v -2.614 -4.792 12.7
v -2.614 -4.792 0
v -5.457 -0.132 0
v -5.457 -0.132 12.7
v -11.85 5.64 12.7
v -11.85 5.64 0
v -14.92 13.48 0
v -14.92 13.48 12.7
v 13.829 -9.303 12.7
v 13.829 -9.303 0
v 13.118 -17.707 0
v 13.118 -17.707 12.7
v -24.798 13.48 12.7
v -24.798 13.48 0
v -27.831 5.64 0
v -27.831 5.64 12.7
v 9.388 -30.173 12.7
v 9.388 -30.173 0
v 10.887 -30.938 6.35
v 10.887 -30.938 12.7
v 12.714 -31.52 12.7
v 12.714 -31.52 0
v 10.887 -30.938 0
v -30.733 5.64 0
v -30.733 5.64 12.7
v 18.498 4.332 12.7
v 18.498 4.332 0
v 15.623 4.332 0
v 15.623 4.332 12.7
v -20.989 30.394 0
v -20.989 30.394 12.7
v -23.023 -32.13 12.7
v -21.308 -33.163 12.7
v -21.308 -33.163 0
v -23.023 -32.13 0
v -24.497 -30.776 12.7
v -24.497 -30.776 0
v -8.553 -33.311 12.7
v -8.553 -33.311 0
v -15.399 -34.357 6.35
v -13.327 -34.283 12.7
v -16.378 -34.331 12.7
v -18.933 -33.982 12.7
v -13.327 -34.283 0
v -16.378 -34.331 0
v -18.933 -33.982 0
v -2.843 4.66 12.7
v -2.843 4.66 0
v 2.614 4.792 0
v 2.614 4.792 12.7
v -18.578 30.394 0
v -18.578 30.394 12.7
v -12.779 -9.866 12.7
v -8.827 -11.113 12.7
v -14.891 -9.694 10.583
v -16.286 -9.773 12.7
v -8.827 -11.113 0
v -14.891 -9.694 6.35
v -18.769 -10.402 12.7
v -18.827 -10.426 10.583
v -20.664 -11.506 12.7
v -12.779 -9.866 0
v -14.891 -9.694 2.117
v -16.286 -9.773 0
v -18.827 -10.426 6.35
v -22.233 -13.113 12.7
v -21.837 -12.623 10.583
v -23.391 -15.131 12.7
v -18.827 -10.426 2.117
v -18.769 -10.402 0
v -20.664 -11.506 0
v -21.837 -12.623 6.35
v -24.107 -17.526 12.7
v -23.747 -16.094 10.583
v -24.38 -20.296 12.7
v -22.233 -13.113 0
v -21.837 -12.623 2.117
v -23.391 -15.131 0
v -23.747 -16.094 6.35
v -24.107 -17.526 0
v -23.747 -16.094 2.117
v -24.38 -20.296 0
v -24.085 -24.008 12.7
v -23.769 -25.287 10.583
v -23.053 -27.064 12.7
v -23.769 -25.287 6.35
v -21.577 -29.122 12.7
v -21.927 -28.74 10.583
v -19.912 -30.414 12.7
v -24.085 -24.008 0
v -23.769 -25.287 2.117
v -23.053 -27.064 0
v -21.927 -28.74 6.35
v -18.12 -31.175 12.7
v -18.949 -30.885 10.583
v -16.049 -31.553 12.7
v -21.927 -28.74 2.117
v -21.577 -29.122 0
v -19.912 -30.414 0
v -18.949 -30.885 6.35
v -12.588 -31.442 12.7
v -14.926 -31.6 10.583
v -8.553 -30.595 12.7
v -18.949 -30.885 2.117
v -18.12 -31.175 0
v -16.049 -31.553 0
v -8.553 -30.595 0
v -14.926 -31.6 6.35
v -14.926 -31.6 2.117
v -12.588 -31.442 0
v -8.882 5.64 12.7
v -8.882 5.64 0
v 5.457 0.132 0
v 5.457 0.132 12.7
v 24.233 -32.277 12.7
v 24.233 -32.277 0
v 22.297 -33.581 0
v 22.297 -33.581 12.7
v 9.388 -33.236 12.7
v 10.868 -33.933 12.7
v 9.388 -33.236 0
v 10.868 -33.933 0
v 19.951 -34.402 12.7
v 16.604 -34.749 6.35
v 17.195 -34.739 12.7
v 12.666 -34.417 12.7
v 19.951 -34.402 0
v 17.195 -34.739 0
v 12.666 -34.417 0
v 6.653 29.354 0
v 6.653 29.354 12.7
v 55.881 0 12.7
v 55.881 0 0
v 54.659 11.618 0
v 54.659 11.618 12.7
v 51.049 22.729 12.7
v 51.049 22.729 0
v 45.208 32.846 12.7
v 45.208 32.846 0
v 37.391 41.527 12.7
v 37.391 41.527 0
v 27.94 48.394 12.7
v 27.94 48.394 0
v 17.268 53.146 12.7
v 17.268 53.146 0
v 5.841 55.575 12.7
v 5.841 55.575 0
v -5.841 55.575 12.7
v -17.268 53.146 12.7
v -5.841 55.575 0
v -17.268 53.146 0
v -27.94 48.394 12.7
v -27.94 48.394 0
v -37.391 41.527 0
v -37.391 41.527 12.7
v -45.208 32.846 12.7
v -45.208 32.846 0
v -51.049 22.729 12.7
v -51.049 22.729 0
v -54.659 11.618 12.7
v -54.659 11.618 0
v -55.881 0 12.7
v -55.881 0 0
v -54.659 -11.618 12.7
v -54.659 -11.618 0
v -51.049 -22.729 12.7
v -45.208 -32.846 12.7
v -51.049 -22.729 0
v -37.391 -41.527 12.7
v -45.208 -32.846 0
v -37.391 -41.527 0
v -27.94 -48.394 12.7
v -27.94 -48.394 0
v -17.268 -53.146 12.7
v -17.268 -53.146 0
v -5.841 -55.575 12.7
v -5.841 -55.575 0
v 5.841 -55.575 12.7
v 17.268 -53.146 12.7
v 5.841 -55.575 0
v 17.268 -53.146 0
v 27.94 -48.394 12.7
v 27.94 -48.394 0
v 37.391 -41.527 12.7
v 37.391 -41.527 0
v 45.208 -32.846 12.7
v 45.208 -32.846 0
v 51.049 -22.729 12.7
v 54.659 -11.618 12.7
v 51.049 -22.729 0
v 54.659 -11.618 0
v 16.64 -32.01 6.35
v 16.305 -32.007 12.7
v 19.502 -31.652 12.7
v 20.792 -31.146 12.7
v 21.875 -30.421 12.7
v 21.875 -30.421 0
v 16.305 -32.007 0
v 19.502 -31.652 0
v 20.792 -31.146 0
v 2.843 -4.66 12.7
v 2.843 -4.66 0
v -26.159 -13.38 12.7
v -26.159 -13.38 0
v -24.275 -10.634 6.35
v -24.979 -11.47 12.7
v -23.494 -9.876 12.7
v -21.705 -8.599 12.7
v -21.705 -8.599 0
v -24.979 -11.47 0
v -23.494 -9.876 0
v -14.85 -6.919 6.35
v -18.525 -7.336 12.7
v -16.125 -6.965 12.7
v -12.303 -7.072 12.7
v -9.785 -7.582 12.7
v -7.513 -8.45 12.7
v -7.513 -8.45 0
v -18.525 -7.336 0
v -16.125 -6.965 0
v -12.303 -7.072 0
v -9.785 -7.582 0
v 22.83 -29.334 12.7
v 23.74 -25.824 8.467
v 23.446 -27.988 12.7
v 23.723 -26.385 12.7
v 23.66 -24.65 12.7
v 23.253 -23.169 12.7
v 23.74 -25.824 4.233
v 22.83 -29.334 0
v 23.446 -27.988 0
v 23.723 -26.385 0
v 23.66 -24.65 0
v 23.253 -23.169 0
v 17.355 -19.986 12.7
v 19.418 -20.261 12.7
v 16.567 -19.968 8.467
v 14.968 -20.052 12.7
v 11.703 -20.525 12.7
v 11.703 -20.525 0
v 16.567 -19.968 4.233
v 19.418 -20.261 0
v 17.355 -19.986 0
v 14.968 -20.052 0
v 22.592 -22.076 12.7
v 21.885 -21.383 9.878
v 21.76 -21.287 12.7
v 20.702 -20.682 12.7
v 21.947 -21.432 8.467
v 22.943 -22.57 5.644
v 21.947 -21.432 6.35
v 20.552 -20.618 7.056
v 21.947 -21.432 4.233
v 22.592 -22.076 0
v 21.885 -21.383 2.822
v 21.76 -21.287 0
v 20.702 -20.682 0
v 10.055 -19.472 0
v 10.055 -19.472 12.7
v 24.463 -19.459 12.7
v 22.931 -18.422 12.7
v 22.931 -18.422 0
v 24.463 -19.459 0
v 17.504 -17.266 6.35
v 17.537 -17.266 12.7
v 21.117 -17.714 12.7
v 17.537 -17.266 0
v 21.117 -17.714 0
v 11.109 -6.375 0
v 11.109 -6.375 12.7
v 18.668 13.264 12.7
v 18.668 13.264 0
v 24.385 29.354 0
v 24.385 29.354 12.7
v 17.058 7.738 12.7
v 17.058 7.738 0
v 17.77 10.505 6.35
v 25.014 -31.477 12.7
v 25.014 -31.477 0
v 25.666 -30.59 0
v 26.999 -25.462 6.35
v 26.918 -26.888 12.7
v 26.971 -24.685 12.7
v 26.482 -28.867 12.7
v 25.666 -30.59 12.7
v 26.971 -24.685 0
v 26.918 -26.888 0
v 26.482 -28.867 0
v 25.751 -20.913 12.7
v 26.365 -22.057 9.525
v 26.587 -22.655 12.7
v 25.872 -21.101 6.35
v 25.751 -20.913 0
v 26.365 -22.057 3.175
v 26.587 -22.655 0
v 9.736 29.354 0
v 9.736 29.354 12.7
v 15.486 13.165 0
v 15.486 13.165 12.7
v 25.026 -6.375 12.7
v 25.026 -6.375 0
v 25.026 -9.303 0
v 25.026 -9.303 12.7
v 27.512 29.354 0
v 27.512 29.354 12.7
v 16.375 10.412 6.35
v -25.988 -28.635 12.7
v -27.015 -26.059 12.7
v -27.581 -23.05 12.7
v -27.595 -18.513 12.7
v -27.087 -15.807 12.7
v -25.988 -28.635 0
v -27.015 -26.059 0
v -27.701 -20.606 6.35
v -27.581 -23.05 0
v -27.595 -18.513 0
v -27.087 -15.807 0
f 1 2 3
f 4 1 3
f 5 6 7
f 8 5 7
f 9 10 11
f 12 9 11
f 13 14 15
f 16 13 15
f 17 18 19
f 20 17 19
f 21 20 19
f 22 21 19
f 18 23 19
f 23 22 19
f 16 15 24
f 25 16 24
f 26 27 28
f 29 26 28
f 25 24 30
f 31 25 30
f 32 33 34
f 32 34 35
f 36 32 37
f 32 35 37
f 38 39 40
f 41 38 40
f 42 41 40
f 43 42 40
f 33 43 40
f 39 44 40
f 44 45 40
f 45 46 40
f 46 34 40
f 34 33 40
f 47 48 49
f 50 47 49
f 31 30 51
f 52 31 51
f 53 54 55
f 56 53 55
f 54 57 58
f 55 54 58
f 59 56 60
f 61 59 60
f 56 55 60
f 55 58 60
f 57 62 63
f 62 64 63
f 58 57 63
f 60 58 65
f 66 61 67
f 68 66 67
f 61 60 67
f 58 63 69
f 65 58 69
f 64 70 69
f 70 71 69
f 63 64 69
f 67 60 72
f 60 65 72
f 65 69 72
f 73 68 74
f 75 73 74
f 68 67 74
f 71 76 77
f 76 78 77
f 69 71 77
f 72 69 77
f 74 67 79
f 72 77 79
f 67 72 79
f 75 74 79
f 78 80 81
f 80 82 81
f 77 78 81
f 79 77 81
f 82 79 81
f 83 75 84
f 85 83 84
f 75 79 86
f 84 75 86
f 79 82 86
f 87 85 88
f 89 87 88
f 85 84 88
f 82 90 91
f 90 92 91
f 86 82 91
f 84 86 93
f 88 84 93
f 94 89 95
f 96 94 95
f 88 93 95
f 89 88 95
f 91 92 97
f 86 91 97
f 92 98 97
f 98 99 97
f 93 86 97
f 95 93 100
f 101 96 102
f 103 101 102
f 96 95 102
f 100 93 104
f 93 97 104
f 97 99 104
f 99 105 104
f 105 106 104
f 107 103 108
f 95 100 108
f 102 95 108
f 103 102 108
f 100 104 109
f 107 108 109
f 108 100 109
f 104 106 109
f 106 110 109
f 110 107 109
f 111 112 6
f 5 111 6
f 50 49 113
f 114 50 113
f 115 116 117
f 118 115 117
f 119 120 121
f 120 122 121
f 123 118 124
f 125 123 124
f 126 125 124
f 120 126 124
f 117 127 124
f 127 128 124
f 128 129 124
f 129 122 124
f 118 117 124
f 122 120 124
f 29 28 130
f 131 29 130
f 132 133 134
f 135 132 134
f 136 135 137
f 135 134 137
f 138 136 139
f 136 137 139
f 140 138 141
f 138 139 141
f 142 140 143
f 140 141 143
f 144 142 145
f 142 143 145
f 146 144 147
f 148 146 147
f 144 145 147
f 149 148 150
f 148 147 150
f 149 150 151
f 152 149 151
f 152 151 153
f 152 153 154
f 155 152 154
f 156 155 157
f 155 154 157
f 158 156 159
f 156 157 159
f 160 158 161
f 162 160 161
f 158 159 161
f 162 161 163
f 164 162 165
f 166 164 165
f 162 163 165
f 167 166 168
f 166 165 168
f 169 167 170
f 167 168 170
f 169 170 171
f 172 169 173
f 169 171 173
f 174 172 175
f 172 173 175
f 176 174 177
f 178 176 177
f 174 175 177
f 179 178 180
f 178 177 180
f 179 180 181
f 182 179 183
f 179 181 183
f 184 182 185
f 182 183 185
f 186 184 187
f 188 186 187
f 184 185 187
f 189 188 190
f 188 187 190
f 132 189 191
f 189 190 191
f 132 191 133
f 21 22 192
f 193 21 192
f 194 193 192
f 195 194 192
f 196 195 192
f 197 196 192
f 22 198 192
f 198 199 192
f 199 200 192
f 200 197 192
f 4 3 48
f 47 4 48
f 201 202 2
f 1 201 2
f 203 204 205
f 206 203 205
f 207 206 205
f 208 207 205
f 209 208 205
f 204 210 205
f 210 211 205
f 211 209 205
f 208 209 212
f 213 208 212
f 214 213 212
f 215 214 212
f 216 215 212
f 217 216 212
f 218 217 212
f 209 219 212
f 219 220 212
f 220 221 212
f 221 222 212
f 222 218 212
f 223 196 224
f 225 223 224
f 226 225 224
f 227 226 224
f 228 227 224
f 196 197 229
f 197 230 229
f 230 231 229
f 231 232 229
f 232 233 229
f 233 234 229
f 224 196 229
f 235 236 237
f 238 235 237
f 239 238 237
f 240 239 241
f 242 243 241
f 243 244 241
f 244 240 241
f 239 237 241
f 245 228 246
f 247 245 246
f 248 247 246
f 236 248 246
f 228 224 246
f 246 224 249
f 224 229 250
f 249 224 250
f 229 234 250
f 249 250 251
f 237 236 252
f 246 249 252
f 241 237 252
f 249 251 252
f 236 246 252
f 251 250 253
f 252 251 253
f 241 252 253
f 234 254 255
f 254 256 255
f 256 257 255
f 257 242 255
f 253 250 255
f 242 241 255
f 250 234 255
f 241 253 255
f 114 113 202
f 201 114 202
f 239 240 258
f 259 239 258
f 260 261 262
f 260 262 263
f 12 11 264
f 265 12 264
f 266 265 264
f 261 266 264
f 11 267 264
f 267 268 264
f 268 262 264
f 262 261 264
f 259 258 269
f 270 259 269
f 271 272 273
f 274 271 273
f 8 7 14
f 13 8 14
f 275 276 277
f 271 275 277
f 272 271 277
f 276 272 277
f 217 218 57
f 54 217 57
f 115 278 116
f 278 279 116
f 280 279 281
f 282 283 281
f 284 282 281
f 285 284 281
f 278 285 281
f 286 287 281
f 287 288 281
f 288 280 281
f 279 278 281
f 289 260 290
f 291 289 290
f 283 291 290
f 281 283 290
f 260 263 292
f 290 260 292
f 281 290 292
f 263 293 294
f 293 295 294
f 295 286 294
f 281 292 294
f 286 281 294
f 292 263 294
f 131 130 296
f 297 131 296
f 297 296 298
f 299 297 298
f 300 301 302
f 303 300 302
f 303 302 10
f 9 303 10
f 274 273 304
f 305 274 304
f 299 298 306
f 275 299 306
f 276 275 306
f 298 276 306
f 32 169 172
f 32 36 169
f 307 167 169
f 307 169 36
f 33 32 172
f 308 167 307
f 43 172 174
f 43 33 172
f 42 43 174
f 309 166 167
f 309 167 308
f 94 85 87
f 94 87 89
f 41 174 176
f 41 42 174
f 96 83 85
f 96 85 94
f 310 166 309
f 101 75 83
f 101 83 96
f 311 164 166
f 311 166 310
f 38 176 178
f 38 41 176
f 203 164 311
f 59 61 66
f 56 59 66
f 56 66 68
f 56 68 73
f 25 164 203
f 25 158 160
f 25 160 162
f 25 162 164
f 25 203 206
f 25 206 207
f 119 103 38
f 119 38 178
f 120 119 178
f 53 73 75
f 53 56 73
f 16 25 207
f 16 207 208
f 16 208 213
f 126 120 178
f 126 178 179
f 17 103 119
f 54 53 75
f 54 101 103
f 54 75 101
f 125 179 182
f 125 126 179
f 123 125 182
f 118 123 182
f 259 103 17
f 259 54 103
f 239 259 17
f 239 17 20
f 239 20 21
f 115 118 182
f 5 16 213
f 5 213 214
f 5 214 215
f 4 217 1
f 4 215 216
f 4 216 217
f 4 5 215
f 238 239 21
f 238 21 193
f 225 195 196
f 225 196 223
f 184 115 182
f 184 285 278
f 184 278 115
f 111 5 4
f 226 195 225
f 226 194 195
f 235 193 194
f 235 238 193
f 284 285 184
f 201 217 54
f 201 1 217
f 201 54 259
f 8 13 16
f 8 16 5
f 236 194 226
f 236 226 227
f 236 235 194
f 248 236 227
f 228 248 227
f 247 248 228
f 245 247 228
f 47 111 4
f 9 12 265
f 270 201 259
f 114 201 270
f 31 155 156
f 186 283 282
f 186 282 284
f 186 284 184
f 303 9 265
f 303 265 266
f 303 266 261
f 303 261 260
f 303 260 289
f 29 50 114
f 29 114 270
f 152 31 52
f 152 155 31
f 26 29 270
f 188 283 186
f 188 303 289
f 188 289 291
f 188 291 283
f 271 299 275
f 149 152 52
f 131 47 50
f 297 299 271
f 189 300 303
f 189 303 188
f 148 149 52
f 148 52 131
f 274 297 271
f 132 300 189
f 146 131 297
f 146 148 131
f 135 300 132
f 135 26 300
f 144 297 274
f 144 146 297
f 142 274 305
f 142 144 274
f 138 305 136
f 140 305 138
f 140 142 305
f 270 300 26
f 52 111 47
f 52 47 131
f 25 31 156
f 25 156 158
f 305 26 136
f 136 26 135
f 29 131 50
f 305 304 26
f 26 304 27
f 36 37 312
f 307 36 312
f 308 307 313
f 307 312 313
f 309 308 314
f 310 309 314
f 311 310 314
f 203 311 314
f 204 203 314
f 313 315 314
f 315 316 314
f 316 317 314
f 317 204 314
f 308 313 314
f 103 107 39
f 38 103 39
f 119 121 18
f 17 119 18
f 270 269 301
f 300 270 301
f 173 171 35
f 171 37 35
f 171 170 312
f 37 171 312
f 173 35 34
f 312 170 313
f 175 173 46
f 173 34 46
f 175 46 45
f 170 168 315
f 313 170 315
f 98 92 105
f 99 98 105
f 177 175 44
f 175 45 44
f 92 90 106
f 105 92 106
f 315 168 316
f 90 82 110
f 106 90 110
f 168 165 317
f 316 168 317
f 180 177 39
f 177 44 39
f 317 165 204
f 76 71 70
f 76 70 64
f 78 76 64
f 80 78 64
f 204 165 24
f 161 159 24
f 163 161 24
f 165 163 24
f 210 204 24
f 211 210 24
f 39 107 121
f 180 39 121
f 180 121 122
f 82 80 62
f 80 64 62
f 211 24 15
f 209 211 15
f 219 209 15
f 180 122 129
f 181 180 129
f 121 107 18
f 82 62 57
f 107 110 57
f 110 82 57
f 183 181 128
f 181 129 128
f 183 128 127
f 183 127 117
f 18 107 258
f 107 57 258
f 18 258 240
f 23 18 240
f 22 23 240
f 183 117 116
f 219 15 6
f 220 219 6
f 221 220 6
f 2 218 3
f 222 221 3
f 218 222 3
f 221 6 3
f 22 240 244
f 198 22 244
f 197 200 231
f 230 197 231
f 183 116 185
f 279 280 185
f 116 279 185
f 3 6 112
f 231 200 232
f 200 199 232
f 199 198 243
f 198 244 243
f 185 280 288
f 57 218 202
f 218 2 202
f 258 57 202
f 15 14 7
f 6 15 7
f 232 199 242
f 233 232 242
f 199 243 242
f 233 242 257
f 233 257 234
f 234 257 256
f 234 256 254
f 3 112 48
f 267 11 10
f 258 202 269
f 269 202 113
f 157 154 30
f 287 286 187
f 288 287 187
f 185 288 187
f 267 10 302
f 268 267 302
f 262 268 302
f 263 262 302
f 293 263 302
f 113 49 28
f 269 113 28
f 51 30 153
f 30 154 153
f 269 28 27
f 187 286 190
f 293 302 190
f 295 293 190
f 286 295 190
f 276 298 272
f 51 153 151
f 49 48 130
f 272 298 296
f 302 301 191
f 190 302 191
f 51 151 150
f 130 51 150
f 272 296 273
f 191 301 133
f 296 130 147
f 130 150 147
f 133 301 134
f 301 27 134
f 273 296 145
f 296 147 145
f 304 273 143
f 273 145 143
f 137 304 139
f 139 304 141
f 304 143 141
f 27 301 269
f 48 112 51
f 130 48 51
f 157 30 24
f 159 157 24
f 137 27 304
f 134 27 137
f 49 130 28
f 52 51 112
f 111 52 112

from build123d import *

# Parameters (mm, degrees)
F0_R     = 55.8806252639
F1_DEPTH = 12.7


with BuildPart() as f1:
    # F0 (on Top) → F1 (new body)
    with BuildSketch(Plane.XY):
        Circle(F0_R)
        with BuildLine():
            add(Edge.make_bspline(
                [(-8.8274130972, -11.1133217732), (-11.8591704488, -9.6938284468), (-14.8909278004, -9.6938284468)],
                knots=[0, 0, 0, 1, 1, 1], degree=2))
            add(Edge.make_bspline(
                [(-14.8909278004, -9.6938284468), (-19.2896046515, -9.6938284468), (-21.8365144883, -12.6233589127)],
                knots=[0, 0, 0, 1, 1, 1], degree=2))
            add(Edge.make_bspline(
                [(-21.8365144883, -12.6233589127), (-24.3834243251, -15.5528893786), (-24.3834243251, -20.6467090522)],
                knots=[0, 0, 0, 1, 1, 1], degree=2))
            add(Edge.make_bspline(
                [(-24.3834243251, -20.6467090522), (-24.3834243251, -25.8807255975), (-21.9270583013, -28.7401576276)],
                knots=[0, 0, 0, 1, 1, 1], degree=2))
            add(Edge.make_bspline(
                [(-21.9270583013, -28.7401576276), (-19.4706922775, -31.5995896577), (-14.9259770183, -31.5995896577)],
                knots=[0, 0, 0, 1, 1, 1], degree=2))
            add(Edge.make_bspline(
                [(-14.9259770183, -31.5995896577), (-12.133722656, -31.5995896577), (-8.55286089, -30.5948454101)],
                knots=[0, 0, 0, 1, 1, 1], degree=2))
            Line((-8.55286089, -30.5948454101), (-8.55286089, -33.3111598003))
            add(Edge.make_bspline(
                [(-8.55286089, -33.3111598003), (-11.3275906434, -34.3567948021), (-15.3991414605, -34.3567948021)],
                knots=[0, 0, 0, 1, 1, 1], degree=2))
            add(Edge.make_bspline(
                [(-15.3991414605, -34.3567948021), (-21.2932516103, -34.3567948021), (-24.4973342834, -30.7759330361)],
                knots=[0, 0, 0, 1, 1, 1], degree=2))
            add(Edge.make_bspline(
                [(-24.4973342834, -30.7759330361), (-27.7014169565, -27.1950712702), (-27.7014169565, -20.605818298)],
                knots=[0, 0, 0, 1, 1, 1], degree=2))
            add(Edge.make_bspline(
                [(-27.7014169565, -20.605818298), (-27.7014169565, -16.481693654), (-26.1592513673, -13.3798378665)],
                knots=[0, 0, 0, 1, 1, 1], degree=2))
            add(Edge.make_bspline(
                [(-26.1592513673, -13.3798378665), (-24.617085778, -10.2779820791), (-21.705079921, -8.5985403862)],
                knots=[0, 0, 0, 1, 1, 1], degree=2))
            add(Edge.make_bspline(
                [(-21.705079921, -8.5985403862), (-18.7930740641, -6.9190986934), (-14.8500370461, -6.9190986934)],
                knots=[0, 0, 0, 1, 1, 1], degree=2))
            add(Edge.make_bspline(
                [(-14.8500370461, -6.9190986934), (-10.6558139663, -6.9190986934), (-7.5130674245, -8.44958121)],
                knots=[0, 0, 0, 1, 1, 1], degree=2))
            Line((-7.5130674245, -8.44958121), (-8.8274130972, -11.1133217732))
        make_face(mode=Mode.SUBTRACT)
        Polygon((-2.8433452334, 4.6599686343), (2.6139786014, 4.792393521), (5.4573238349, 0.1324248867), (2.8433452334, -4.6599686343), (-2.6139786014, -4.792393521), (-5.4573238349, -0.1324248867), align=None, mode=Mode.SUBTRACT)
        with BuildLine():
            add(Edge.make_bspline(
                [(13.118225471, -17.7074033137), (15.3172801058, -17.2663672866), (17.5040837399, -17.2663672866)],
                knots=[0, 0, 0, 1, 1, 1], degree=2))
            add(Edge.make_bspline(
                [(17.5040837399, -17.2663672866), (21.926695011, -17.2663672866), (24.4626521665, -19.4592964211)],
                knots=[0, 0, 0, 1, 1, 1], degree=2))
            add(Edge.make_bspline(
                [(24.4626521665, -19.4592964211), (26.998609322, -21.6522255555), (26.998609322, -25.4622867892)],
                knots=[0, 0, 0, 1, 1, 1], degree=2))
            add(Edge.make_bspline(
                [(26.998609322, -25.4622867892), (26.998609322, -29.8052665554), (24.2329459024, -32.276905957)],
                knots=[0, 0, 0, 1, 1, 1], degree=2))
            add(Edge.make_bspline(
                [(24.2329459024, -32.276905957), (21.4672824829, -34.7485453585), (16.6036351847, -34.7485453585)],
                knots=[0, 0, 0, 1, 1, 1], degree=2))
            add(Edge.make_bspline(
                [(16.6036351847, -34.7485453585), (11.8747488947, -34.7485453585), (9.3877957422, -33.2355467658)],
                knots=[0, 0, 0, 1, 1, 1], degree=2))
            Line((9.3877957422, -33.2355467658), (9.3877957422, -30.172796578))
            add(Edge.make_bspline(
                [(9.3877957422, -30.172796578), (10.7231548241, -31.0303666306), (12.7139424462, -31.5204066606)],
                knots=[0, 0, 0, 1, 1, 1], degree=2))
            add(Edge.make_bspline(
                [(12.7139424462, -31.5204066606), (14.7047300682, -32.0104466906), (16.6403881869, -32.0104466906)],
                knots=[0, 0, 0, 1, 1, 1], degree=2))
            add(Edge.make_bspline(
                [(16.6403881869, -32.0104466906), (20.0094133935, -32.0104466906), (21.8746282578, -30.4208793432)],
                knots=[0, 0, 0, 1, 1, 1], degree=2))
            add(Edge.make_bspline(
                [(21.8746282578, -30.4208793432), (23.7398431222, -28.8313119957), (23.7398431222, -25.8236913113)],
                knots=[0, 0, 0, 1, 1, 1], degree=2))
            add(Edge.make_bspline(
                [(23.7398431222, -25.8236913113), (23.7398431222, -19.9677129523), (16.5668821824, -19.9677129523)],
                knots=[0, 0, 0, 1, 1, 1], degree=2))
            add(Edge.make_bspline(
                [(16.5668821824, -19.9677129523), (14.7476085709, -19.9677129523), (11.7032348842, -20.5251334864)],
                knots=[0, 0, 0, 1, 1, 1], degree=2))
            Line((11.7032348842, -20.5251334864), (10.0554752832, -19.4715474218))
            Line((10.0554752832, -19.4715474218), (11.1090613478, -6.3752276189))
            Line((11.1090613478, -6.3752276189), (25.0261982011, -6.3752276189))
            Line((25.0261982011, -6.3752276189), (25.0261982011, -9.3032167984))
            Line((25.0261982011, -9.3032167984), (13.8287835145, -9.3032167984))
            Line((13.8287835145, -9.3032167984), (13.118225471, -17.7074033137))
        make_face(mode=Mode.SUBTRACT)
        Polygon((-8.8821777954, 5.6402049959), (-11.8495973103, 5.6402049959), (-14.9195276811, 13.4795878234), (-24.7983370116, 13.4795878234), (-27.830500225, 5.6402049959), (-30.7331760414, 5.6402049959), (-20.9892494161, 30.3938790583), (-18.5775466468, 30.3938790583), align=None, mode=Mode.SUBTRACT)
        with BuildLine():
            Line((18.6679722386, 13.2637759067), (24.385376429, 29.3535589635))
            Line((24.385376429, 29.3535589635), (27.5124241231, 29.3535589635))
            Line((27.5124241231, 29.3535589635), (18.4982025739, 4.3317009695))
            Line((18.4982025739, 4.3317009695), (15.6230711564, 4.3317009695))
            Line((15.6230711564, 4.3317009695), (6.6526611336, 29.3535589635))
            Line((6.6526611336, 29.3535589635), (9.7358973013, 29.3535589635))
            Line((9.7358973013, 29.3535589635), (15.4861601365, 13.1651999724))
            add(Edge.make_bspline(
                [(15.4861601365, 13.1651999724), (16.4773959204, 10.3722151668), (17.0578986448, 7.7380471442)],
                knots=[0, 0, 0, 1, 1, 1], degree=2))
            add(Edge.make_bspline(
                [(17.0578986448, 7.7380471442), (17.6767364546, 10.5091261867), (18.6679722386, 13.2637759067)],
                knots=[0, 0, 0, 1, 1, 1], degree=2))
        make_face(mode=Mode.SUBTRACT)
    extrude(amount=F1_DEPTH)


solid = f1.part
